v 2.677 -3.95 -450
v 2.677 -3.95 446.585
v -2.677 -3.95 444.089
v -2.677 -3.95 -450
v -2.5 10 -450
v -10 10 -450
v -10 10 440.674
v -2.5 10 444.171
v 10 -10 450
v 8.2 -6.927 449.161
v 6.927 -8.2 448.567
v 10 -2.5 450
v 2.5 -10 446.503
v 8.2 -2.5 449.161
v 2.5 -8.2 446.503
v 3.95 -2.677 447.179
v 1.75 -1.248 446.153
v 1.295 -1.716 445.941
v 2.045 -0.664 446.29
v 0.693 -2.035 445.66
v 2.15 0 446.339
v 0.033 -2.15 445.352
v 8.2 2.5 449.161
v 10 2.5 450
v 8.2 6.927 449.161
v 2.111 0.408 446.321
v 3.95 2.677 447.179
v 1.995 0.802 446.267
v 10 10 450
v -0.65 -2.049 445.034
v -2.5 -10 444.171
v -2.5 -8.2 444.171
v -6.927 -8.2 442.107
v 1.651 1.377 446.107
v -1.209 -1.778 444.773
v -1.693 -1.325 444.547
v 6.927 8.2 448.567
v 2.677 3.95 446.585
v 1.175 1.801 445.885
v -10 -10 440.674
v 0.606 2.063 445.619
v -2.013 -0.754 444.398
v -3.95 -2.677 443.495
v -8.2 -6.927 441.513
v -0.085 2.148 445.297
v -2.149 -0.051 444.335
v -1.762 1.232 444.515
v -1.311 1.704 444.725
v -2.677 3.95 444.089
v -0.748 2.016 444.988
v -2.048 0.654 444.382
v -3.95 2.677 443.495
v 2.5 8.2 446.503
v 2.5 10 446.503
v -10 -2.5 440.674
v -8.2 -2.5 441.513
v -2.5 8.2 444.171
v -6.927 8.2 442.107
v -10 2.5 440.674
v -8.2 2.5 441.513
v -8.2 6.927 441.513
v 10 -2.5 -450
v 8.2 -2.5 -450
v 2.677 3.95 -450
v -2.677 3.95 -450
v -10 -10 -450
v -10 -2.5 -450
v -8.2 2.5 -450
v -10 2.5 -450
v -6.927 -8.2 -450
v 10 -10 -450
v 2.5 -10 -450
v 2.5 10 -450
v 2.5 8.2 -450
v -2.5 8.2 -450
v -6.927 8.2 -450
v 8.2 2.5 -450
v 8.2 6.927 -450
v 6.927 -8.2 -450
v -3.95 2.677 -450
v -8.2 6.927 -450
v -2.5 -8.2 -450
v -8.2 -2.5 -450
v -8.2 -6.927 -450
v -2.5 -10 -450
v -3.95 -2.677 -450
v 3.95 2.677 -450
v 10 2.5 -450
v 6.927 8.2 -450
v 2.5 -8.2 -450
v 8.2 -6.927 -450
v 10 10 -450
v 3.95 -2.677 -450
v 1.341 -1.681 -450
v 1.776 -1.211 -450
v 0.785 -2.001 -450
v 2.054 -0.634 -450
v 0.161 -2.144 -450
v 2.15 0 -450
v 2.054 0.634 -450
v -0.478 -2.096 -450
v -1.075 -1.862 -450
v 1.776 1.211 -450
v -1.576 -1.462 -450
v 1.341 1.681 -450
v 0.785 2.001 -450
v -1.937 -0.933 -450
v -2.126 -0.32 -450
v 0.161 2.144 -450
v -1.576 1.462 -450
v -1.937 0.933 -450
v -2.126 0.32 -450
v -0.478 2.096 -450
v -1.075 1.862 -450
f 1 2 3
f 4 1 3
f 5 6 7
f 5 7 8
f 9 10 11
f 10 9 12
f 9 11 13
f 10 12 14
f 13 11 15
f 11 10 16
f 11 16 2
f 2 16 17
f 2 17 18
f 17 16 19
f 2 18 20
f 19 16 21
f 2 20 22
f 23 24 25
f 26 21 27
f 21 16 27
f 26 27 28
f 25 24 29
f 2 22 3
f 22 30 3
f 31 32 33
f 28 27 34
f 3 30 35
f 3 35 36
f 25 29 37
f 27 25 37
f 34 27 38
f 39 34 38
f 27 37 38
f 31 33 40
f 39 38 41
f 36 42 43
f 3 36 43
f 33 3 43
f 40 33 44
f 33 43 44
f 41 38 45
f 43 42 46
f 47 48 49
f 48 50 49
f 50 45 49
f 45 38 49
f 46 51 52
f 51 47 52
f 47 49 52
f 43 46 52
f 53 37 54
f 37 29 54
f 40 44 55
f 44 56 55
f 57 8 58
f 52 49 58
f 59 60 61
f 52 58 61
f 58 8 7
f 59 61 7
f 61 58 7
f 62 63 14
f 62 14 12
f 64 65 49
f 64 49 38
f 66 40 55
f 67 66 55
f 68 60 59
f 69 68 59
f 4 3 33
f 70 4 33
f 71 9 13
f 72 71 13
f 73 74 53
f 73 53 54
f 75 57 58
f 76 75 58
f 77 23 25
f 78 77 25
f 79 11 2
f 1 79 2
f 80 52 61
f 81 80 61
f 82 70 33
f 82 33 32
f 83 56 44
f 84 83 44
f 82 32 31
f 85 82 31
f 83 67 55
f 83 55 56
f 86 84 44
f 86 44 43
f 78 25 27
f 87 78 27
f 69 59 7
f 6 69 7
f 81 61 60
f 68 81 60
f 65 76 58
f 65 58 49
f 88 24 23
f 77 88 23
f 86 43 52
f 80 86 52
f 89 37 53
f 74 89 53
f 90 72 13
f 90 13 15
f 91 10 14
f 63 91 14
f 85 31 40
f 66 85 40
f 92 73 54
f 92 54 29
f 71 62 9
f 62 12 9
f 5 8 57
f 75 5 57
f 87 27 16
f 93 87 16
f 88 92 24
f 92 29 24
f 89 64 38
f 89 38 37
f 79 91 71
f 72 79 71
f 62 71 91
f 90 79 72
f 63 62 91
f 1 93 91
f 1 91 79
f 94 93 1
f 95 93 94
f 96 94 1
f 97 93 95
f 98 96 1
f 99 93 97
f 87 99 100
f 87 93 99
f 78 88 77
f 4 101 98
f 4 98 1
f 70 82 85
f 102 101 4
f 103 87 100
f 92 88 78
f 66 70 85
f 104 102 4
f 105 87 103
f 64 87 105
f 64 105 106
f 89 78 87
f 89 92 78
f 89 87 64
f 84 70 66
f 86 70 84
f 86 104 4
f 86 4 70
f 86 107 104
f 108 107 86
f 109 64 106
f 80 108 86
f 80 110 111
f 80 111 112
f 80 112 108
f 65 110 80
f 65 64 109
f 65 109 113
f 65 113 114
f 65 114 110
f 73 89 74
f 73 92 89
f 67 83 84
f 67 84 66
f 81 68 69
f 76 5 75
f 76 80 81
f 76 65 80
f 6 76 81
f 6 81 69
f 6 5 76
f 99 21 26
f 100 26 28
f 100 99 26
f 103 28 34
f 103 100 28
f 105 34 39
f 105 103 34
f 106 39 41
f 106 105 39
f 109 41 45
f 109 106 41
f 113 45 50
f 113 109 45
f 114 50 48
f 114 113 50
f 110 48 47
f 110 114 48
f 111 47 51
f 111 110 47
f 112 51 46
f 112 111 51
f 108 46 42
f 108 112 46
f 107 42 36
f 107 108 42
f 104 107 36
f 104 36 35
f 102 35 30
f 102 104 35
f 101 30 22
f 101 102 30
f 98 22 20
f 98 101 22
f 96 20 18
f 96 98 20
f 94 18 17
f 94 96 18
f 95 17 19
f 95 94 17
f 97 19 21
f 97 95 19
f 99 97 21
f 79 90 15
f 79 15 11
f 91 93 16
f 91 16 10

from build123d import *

# Parameters (mm, degrees)
SKETCH2_R           = 2.15
BOSS_EXTRUDE1_DEPTH = 450
CUT_EXTRUDE1_DEPTH  = 21


with BuildPart() as part:
    # Sketch2 → Boss-Extrude1 (new body, symmetric)
    with BuildSketch(Plane.XY):
        Polygon((-2.5, 10), (-2.5, 8.2), (-6.927207794, 8.2), (-2.677207794, 3.95), (2.677207794, 3.95), (6.927207794, 8.2), (2.5, 8.2), (2.5, 10), (10, 10), (10, 2.5), (8.2, 2.5), (8.2, 6.927207794), (3.95, 2.677207794), (3.95, -2.677207794), (8.2, -6.927207794), (8.2, -2.5), (10, -2.5), (10, -10), (2.5, -10), (2.5, -8.2), (6.927207794, -8.2), (2.677207794, -3.95), (-2.677207794, -3.95), (-6.927207794, -8.2), (-2.5, -8.2), (-2.5, -10), (-10, -10), (-10, -2.5), (-8.2, -2.5), (-8.2, -6.927207794), (-3.95, -2.677207794), (-3.95, 2.677207794), (-8.2, 6.927207794), (-8.2, 2.5), (-10, 2.5), (-10, 10), align=None)
        Circle(SKETCH2_R, mode=Mode.SUBTRACT)
    extrude(amount=BOSS_EXTRUDE1_DEPTH, both=True)

    # Sketch3 → Cut-Extrude1 (cut, through all)
    with BuildSketch(Plane(origin=(0, 10, 0), x_dir=(1, 0, 0), z_dir=(0, 1, 0))):
        Polygon((-10, -450), (10, -450), (-10, -440.673846837), align=None)
    extrude(amount=-CUT_EXTRUDE1_DEPTH, mode=Mode.SUBTRACT)


solid = part.part
